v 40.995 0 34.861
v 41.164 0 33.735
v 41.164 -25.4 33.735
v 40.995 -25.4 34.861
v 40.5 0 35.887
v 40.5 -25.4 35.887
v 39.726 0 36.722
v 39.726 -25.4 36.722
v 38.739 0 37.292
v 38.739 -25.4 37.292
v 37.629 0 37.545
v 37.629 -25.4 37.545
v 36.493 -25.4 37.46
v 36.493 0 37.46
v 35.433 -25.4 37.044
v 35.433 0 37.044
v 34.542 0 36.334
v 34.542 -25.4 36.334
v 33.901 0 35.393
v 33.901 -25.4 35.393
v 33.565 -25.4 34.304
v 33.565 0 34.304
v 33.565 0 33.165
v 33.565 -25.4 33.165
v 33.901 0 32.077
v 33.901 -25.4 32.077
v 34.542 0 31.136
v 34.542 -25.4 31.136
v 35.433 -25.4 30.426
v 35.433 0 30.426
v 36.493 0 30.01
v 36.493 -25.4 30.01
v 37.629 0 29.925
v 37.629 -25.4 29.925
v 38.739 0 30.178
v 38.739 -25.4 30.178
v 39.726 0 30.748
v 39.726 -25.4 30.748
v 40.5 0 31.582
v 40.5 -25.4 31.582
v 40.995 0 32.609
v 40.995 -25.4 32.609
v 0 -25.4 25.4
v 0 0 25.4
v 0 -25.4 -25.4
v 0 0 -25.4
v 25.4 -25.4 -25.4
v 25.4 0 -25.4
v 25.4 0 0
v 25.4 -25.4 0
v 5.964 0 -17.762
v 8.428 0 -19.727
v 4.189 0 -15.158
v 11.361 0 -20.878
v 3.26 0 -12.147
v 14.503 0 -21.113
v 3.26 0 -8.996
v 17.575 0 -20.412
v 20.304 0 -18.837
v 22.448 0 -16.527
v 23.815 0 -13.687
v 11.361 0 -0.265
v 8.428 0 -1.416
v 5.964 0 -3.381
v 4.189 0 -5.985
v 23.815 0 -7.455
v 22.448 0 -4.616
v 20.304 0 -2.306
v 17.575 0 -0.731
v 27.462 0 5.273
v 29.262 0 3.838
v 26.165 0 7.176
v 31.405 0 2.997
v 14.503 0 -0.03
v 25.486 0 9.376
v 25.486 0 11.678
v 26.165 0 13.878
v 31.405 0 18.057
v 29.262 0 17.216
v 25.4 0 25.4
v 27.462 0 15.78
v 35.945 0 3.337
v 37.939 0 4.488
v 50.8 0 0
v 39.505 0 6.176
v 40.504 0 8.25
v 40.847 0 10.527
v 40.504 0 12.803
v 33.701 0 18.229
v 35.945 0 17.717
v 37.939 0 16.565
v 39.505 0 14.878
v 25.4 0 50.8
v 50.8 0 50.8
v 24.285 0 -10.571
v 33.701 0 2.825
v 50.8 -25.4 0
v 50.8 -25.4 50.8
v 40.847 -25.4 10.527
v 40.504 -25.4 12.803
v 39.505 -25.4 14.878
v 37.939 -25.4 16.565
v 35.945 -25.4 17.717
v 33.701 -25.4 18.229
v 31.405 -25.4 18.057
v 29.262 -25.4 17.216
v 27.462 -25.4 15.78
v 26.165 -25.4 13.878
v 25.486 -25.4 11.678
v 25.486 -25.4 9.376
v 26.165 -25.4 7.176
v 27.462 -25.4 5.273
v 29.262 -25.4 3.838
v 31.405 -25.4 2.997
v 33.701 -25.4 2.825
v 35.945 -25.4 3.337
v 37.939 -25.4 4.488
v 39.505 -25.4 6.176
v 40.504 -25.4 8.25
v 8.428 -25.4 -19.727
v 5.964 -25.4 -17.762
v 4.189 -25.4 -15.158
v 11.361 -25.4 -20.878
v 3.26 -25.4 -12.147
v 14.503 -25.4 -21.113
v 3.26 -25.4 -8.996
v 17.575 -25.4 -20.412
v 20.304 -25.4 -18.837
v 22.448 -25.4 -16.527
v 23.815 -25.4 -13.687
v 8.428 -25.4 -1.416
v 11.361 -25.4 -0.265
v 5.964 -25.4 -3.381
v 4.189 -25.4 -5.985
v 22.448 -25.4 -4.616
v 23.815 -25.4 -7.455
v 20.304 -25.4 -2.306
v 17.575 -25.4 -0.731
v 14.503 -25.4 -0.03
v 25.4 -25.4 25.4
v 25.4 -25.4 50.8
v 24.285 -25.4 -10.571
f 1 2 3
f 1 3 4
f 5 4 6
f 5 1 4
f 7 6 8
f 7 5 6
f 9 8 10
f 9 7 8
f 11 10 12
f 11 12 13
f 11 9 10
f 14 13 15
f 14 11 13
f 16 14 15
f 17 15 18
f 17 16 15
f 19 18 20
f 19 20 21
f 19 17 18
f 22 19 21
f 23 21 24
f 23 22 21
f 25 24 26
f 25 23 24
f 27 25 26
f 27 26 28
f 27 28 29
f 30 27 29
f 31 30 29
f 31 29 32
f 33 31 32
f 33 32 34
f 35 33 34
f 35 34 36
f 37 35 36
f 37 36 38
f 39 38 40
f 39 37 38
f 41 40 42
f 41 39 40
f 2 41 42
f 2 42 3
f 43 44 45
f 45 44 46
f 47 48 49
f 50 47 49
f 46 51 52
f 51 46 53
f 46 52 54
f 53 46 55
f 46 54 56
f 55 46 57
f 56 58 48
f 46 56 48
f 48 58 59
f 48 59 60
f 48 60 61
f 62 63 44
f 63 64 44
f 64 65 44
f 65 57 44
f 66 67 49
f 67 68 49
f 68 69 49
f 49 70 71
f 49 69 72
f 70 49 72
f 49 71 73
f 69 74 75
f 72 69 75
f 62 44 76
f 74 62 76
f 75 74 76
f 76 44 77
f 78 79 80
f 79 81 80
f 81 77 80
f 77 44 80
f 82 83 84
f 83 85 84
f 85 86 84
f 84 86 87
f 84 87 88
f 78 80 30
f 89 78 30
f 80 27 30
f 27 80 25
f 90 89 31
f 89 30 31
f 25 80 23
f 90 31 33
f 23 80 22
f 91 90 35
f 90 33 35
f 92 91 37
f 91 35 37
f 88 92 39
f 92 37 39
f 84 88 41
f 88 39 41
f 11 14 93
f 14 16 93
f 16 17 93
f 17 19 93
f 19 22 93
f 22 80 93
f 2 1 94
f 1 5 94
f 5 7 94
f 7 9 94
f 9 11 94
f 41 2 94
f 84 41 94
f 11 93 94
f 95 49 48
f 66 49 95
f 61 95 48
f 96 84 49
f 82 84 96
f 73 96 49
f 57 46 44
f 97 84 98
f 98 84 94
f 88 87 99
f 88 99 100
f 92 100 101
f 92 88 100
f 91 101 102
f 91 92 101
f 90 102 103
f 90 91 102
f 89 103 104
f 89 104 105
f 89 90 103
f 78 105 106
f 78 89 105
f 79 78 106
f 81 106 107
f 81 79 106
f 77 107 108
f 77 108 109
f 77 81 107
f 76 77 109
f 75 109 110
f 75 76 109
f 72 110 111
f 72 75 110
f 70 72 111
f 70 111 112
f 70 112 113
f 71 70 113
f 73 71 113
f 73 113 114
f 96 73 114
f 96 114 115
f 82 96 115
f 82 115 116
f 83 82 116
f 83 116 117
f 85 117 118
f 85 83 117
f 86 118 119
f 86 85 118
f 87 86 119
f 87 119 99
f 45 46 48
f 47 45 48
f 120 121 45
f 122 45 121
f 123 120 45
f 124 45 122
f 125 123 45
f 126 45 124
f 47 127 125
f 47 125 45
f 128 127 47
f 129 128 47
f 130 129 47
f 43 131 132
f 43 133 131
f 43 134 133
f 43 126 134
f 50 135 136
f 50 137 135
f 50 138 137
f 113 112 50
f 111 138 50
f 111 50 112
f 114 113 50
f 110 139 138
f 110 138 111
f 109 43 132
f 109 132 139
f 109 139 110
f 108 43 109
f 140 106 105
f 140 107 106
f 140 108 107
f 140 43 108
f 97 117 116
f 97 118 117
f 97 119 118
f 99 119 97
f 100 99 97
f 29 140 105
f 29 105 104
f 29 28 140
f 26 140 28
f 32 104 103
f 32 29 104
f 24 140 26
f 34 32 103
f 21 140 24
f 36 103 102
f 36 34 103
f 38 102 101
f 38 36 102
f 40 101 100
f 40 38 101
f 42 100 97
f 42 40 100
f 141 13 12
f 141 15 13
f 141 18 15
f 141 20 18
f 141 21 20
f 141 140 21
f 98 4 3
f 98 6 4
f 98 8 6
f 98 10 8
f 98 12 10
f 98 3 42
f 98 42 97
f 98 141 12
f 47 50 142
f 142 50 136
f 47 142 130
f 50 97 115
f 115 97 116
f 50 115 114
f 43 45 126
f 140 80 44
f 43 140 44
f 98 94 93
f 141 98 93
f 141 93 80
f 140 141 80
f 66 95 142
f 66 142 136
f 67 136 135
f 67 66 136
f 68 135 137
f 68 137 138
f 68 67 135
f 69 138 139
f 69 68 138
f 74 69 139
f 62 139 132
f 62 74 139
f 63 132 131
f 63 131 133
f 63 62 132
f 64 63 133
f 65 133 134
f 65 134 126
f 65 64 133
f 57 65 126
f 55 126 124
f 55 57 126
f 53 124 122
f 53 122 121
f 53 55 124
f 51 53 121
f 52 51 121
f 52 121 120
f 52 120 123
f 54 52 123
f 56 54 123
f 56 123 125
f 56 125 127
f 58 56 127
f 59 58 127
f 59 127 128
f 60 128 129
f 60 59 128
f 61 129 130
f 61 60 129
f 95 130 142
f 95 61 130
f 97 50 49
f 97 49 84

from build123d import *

# Parameters (mm, degrees)
F0_R     = 10.571471
F0_R_2   = 7.723691
F0_R_3   = 3.821059
F1_DEPTH = 25.4


with BuildPart() as f1:
    # F0 (on Front) → F1 (new body)
    with BuildSketch(Plane.XZ):
        Polygon((0, 0), (0, -25.4), (25.4, -25.4), (25.4, 0), (50.8, 0), (50.8, 25.4), (50.8, 50.8), (25.4, 50.8), (25.4, 25.4), (0, 25.4), align=None)
        with Locations((13.713269, -10.571471)):
            Circle(F0_R, mode=Mode.SUBTRACT)
        with Locations((33.123691, 10.526813)):
            Circle(F0_R_2, mode=Mode.SUBTRACT)
        with Locations((37.343346, 33.734929)):
            Circle(F0_R_3, mode=Mode.SUBTRACT)
    extrude(amount=F1_DEPTH)


solid = f1.part
